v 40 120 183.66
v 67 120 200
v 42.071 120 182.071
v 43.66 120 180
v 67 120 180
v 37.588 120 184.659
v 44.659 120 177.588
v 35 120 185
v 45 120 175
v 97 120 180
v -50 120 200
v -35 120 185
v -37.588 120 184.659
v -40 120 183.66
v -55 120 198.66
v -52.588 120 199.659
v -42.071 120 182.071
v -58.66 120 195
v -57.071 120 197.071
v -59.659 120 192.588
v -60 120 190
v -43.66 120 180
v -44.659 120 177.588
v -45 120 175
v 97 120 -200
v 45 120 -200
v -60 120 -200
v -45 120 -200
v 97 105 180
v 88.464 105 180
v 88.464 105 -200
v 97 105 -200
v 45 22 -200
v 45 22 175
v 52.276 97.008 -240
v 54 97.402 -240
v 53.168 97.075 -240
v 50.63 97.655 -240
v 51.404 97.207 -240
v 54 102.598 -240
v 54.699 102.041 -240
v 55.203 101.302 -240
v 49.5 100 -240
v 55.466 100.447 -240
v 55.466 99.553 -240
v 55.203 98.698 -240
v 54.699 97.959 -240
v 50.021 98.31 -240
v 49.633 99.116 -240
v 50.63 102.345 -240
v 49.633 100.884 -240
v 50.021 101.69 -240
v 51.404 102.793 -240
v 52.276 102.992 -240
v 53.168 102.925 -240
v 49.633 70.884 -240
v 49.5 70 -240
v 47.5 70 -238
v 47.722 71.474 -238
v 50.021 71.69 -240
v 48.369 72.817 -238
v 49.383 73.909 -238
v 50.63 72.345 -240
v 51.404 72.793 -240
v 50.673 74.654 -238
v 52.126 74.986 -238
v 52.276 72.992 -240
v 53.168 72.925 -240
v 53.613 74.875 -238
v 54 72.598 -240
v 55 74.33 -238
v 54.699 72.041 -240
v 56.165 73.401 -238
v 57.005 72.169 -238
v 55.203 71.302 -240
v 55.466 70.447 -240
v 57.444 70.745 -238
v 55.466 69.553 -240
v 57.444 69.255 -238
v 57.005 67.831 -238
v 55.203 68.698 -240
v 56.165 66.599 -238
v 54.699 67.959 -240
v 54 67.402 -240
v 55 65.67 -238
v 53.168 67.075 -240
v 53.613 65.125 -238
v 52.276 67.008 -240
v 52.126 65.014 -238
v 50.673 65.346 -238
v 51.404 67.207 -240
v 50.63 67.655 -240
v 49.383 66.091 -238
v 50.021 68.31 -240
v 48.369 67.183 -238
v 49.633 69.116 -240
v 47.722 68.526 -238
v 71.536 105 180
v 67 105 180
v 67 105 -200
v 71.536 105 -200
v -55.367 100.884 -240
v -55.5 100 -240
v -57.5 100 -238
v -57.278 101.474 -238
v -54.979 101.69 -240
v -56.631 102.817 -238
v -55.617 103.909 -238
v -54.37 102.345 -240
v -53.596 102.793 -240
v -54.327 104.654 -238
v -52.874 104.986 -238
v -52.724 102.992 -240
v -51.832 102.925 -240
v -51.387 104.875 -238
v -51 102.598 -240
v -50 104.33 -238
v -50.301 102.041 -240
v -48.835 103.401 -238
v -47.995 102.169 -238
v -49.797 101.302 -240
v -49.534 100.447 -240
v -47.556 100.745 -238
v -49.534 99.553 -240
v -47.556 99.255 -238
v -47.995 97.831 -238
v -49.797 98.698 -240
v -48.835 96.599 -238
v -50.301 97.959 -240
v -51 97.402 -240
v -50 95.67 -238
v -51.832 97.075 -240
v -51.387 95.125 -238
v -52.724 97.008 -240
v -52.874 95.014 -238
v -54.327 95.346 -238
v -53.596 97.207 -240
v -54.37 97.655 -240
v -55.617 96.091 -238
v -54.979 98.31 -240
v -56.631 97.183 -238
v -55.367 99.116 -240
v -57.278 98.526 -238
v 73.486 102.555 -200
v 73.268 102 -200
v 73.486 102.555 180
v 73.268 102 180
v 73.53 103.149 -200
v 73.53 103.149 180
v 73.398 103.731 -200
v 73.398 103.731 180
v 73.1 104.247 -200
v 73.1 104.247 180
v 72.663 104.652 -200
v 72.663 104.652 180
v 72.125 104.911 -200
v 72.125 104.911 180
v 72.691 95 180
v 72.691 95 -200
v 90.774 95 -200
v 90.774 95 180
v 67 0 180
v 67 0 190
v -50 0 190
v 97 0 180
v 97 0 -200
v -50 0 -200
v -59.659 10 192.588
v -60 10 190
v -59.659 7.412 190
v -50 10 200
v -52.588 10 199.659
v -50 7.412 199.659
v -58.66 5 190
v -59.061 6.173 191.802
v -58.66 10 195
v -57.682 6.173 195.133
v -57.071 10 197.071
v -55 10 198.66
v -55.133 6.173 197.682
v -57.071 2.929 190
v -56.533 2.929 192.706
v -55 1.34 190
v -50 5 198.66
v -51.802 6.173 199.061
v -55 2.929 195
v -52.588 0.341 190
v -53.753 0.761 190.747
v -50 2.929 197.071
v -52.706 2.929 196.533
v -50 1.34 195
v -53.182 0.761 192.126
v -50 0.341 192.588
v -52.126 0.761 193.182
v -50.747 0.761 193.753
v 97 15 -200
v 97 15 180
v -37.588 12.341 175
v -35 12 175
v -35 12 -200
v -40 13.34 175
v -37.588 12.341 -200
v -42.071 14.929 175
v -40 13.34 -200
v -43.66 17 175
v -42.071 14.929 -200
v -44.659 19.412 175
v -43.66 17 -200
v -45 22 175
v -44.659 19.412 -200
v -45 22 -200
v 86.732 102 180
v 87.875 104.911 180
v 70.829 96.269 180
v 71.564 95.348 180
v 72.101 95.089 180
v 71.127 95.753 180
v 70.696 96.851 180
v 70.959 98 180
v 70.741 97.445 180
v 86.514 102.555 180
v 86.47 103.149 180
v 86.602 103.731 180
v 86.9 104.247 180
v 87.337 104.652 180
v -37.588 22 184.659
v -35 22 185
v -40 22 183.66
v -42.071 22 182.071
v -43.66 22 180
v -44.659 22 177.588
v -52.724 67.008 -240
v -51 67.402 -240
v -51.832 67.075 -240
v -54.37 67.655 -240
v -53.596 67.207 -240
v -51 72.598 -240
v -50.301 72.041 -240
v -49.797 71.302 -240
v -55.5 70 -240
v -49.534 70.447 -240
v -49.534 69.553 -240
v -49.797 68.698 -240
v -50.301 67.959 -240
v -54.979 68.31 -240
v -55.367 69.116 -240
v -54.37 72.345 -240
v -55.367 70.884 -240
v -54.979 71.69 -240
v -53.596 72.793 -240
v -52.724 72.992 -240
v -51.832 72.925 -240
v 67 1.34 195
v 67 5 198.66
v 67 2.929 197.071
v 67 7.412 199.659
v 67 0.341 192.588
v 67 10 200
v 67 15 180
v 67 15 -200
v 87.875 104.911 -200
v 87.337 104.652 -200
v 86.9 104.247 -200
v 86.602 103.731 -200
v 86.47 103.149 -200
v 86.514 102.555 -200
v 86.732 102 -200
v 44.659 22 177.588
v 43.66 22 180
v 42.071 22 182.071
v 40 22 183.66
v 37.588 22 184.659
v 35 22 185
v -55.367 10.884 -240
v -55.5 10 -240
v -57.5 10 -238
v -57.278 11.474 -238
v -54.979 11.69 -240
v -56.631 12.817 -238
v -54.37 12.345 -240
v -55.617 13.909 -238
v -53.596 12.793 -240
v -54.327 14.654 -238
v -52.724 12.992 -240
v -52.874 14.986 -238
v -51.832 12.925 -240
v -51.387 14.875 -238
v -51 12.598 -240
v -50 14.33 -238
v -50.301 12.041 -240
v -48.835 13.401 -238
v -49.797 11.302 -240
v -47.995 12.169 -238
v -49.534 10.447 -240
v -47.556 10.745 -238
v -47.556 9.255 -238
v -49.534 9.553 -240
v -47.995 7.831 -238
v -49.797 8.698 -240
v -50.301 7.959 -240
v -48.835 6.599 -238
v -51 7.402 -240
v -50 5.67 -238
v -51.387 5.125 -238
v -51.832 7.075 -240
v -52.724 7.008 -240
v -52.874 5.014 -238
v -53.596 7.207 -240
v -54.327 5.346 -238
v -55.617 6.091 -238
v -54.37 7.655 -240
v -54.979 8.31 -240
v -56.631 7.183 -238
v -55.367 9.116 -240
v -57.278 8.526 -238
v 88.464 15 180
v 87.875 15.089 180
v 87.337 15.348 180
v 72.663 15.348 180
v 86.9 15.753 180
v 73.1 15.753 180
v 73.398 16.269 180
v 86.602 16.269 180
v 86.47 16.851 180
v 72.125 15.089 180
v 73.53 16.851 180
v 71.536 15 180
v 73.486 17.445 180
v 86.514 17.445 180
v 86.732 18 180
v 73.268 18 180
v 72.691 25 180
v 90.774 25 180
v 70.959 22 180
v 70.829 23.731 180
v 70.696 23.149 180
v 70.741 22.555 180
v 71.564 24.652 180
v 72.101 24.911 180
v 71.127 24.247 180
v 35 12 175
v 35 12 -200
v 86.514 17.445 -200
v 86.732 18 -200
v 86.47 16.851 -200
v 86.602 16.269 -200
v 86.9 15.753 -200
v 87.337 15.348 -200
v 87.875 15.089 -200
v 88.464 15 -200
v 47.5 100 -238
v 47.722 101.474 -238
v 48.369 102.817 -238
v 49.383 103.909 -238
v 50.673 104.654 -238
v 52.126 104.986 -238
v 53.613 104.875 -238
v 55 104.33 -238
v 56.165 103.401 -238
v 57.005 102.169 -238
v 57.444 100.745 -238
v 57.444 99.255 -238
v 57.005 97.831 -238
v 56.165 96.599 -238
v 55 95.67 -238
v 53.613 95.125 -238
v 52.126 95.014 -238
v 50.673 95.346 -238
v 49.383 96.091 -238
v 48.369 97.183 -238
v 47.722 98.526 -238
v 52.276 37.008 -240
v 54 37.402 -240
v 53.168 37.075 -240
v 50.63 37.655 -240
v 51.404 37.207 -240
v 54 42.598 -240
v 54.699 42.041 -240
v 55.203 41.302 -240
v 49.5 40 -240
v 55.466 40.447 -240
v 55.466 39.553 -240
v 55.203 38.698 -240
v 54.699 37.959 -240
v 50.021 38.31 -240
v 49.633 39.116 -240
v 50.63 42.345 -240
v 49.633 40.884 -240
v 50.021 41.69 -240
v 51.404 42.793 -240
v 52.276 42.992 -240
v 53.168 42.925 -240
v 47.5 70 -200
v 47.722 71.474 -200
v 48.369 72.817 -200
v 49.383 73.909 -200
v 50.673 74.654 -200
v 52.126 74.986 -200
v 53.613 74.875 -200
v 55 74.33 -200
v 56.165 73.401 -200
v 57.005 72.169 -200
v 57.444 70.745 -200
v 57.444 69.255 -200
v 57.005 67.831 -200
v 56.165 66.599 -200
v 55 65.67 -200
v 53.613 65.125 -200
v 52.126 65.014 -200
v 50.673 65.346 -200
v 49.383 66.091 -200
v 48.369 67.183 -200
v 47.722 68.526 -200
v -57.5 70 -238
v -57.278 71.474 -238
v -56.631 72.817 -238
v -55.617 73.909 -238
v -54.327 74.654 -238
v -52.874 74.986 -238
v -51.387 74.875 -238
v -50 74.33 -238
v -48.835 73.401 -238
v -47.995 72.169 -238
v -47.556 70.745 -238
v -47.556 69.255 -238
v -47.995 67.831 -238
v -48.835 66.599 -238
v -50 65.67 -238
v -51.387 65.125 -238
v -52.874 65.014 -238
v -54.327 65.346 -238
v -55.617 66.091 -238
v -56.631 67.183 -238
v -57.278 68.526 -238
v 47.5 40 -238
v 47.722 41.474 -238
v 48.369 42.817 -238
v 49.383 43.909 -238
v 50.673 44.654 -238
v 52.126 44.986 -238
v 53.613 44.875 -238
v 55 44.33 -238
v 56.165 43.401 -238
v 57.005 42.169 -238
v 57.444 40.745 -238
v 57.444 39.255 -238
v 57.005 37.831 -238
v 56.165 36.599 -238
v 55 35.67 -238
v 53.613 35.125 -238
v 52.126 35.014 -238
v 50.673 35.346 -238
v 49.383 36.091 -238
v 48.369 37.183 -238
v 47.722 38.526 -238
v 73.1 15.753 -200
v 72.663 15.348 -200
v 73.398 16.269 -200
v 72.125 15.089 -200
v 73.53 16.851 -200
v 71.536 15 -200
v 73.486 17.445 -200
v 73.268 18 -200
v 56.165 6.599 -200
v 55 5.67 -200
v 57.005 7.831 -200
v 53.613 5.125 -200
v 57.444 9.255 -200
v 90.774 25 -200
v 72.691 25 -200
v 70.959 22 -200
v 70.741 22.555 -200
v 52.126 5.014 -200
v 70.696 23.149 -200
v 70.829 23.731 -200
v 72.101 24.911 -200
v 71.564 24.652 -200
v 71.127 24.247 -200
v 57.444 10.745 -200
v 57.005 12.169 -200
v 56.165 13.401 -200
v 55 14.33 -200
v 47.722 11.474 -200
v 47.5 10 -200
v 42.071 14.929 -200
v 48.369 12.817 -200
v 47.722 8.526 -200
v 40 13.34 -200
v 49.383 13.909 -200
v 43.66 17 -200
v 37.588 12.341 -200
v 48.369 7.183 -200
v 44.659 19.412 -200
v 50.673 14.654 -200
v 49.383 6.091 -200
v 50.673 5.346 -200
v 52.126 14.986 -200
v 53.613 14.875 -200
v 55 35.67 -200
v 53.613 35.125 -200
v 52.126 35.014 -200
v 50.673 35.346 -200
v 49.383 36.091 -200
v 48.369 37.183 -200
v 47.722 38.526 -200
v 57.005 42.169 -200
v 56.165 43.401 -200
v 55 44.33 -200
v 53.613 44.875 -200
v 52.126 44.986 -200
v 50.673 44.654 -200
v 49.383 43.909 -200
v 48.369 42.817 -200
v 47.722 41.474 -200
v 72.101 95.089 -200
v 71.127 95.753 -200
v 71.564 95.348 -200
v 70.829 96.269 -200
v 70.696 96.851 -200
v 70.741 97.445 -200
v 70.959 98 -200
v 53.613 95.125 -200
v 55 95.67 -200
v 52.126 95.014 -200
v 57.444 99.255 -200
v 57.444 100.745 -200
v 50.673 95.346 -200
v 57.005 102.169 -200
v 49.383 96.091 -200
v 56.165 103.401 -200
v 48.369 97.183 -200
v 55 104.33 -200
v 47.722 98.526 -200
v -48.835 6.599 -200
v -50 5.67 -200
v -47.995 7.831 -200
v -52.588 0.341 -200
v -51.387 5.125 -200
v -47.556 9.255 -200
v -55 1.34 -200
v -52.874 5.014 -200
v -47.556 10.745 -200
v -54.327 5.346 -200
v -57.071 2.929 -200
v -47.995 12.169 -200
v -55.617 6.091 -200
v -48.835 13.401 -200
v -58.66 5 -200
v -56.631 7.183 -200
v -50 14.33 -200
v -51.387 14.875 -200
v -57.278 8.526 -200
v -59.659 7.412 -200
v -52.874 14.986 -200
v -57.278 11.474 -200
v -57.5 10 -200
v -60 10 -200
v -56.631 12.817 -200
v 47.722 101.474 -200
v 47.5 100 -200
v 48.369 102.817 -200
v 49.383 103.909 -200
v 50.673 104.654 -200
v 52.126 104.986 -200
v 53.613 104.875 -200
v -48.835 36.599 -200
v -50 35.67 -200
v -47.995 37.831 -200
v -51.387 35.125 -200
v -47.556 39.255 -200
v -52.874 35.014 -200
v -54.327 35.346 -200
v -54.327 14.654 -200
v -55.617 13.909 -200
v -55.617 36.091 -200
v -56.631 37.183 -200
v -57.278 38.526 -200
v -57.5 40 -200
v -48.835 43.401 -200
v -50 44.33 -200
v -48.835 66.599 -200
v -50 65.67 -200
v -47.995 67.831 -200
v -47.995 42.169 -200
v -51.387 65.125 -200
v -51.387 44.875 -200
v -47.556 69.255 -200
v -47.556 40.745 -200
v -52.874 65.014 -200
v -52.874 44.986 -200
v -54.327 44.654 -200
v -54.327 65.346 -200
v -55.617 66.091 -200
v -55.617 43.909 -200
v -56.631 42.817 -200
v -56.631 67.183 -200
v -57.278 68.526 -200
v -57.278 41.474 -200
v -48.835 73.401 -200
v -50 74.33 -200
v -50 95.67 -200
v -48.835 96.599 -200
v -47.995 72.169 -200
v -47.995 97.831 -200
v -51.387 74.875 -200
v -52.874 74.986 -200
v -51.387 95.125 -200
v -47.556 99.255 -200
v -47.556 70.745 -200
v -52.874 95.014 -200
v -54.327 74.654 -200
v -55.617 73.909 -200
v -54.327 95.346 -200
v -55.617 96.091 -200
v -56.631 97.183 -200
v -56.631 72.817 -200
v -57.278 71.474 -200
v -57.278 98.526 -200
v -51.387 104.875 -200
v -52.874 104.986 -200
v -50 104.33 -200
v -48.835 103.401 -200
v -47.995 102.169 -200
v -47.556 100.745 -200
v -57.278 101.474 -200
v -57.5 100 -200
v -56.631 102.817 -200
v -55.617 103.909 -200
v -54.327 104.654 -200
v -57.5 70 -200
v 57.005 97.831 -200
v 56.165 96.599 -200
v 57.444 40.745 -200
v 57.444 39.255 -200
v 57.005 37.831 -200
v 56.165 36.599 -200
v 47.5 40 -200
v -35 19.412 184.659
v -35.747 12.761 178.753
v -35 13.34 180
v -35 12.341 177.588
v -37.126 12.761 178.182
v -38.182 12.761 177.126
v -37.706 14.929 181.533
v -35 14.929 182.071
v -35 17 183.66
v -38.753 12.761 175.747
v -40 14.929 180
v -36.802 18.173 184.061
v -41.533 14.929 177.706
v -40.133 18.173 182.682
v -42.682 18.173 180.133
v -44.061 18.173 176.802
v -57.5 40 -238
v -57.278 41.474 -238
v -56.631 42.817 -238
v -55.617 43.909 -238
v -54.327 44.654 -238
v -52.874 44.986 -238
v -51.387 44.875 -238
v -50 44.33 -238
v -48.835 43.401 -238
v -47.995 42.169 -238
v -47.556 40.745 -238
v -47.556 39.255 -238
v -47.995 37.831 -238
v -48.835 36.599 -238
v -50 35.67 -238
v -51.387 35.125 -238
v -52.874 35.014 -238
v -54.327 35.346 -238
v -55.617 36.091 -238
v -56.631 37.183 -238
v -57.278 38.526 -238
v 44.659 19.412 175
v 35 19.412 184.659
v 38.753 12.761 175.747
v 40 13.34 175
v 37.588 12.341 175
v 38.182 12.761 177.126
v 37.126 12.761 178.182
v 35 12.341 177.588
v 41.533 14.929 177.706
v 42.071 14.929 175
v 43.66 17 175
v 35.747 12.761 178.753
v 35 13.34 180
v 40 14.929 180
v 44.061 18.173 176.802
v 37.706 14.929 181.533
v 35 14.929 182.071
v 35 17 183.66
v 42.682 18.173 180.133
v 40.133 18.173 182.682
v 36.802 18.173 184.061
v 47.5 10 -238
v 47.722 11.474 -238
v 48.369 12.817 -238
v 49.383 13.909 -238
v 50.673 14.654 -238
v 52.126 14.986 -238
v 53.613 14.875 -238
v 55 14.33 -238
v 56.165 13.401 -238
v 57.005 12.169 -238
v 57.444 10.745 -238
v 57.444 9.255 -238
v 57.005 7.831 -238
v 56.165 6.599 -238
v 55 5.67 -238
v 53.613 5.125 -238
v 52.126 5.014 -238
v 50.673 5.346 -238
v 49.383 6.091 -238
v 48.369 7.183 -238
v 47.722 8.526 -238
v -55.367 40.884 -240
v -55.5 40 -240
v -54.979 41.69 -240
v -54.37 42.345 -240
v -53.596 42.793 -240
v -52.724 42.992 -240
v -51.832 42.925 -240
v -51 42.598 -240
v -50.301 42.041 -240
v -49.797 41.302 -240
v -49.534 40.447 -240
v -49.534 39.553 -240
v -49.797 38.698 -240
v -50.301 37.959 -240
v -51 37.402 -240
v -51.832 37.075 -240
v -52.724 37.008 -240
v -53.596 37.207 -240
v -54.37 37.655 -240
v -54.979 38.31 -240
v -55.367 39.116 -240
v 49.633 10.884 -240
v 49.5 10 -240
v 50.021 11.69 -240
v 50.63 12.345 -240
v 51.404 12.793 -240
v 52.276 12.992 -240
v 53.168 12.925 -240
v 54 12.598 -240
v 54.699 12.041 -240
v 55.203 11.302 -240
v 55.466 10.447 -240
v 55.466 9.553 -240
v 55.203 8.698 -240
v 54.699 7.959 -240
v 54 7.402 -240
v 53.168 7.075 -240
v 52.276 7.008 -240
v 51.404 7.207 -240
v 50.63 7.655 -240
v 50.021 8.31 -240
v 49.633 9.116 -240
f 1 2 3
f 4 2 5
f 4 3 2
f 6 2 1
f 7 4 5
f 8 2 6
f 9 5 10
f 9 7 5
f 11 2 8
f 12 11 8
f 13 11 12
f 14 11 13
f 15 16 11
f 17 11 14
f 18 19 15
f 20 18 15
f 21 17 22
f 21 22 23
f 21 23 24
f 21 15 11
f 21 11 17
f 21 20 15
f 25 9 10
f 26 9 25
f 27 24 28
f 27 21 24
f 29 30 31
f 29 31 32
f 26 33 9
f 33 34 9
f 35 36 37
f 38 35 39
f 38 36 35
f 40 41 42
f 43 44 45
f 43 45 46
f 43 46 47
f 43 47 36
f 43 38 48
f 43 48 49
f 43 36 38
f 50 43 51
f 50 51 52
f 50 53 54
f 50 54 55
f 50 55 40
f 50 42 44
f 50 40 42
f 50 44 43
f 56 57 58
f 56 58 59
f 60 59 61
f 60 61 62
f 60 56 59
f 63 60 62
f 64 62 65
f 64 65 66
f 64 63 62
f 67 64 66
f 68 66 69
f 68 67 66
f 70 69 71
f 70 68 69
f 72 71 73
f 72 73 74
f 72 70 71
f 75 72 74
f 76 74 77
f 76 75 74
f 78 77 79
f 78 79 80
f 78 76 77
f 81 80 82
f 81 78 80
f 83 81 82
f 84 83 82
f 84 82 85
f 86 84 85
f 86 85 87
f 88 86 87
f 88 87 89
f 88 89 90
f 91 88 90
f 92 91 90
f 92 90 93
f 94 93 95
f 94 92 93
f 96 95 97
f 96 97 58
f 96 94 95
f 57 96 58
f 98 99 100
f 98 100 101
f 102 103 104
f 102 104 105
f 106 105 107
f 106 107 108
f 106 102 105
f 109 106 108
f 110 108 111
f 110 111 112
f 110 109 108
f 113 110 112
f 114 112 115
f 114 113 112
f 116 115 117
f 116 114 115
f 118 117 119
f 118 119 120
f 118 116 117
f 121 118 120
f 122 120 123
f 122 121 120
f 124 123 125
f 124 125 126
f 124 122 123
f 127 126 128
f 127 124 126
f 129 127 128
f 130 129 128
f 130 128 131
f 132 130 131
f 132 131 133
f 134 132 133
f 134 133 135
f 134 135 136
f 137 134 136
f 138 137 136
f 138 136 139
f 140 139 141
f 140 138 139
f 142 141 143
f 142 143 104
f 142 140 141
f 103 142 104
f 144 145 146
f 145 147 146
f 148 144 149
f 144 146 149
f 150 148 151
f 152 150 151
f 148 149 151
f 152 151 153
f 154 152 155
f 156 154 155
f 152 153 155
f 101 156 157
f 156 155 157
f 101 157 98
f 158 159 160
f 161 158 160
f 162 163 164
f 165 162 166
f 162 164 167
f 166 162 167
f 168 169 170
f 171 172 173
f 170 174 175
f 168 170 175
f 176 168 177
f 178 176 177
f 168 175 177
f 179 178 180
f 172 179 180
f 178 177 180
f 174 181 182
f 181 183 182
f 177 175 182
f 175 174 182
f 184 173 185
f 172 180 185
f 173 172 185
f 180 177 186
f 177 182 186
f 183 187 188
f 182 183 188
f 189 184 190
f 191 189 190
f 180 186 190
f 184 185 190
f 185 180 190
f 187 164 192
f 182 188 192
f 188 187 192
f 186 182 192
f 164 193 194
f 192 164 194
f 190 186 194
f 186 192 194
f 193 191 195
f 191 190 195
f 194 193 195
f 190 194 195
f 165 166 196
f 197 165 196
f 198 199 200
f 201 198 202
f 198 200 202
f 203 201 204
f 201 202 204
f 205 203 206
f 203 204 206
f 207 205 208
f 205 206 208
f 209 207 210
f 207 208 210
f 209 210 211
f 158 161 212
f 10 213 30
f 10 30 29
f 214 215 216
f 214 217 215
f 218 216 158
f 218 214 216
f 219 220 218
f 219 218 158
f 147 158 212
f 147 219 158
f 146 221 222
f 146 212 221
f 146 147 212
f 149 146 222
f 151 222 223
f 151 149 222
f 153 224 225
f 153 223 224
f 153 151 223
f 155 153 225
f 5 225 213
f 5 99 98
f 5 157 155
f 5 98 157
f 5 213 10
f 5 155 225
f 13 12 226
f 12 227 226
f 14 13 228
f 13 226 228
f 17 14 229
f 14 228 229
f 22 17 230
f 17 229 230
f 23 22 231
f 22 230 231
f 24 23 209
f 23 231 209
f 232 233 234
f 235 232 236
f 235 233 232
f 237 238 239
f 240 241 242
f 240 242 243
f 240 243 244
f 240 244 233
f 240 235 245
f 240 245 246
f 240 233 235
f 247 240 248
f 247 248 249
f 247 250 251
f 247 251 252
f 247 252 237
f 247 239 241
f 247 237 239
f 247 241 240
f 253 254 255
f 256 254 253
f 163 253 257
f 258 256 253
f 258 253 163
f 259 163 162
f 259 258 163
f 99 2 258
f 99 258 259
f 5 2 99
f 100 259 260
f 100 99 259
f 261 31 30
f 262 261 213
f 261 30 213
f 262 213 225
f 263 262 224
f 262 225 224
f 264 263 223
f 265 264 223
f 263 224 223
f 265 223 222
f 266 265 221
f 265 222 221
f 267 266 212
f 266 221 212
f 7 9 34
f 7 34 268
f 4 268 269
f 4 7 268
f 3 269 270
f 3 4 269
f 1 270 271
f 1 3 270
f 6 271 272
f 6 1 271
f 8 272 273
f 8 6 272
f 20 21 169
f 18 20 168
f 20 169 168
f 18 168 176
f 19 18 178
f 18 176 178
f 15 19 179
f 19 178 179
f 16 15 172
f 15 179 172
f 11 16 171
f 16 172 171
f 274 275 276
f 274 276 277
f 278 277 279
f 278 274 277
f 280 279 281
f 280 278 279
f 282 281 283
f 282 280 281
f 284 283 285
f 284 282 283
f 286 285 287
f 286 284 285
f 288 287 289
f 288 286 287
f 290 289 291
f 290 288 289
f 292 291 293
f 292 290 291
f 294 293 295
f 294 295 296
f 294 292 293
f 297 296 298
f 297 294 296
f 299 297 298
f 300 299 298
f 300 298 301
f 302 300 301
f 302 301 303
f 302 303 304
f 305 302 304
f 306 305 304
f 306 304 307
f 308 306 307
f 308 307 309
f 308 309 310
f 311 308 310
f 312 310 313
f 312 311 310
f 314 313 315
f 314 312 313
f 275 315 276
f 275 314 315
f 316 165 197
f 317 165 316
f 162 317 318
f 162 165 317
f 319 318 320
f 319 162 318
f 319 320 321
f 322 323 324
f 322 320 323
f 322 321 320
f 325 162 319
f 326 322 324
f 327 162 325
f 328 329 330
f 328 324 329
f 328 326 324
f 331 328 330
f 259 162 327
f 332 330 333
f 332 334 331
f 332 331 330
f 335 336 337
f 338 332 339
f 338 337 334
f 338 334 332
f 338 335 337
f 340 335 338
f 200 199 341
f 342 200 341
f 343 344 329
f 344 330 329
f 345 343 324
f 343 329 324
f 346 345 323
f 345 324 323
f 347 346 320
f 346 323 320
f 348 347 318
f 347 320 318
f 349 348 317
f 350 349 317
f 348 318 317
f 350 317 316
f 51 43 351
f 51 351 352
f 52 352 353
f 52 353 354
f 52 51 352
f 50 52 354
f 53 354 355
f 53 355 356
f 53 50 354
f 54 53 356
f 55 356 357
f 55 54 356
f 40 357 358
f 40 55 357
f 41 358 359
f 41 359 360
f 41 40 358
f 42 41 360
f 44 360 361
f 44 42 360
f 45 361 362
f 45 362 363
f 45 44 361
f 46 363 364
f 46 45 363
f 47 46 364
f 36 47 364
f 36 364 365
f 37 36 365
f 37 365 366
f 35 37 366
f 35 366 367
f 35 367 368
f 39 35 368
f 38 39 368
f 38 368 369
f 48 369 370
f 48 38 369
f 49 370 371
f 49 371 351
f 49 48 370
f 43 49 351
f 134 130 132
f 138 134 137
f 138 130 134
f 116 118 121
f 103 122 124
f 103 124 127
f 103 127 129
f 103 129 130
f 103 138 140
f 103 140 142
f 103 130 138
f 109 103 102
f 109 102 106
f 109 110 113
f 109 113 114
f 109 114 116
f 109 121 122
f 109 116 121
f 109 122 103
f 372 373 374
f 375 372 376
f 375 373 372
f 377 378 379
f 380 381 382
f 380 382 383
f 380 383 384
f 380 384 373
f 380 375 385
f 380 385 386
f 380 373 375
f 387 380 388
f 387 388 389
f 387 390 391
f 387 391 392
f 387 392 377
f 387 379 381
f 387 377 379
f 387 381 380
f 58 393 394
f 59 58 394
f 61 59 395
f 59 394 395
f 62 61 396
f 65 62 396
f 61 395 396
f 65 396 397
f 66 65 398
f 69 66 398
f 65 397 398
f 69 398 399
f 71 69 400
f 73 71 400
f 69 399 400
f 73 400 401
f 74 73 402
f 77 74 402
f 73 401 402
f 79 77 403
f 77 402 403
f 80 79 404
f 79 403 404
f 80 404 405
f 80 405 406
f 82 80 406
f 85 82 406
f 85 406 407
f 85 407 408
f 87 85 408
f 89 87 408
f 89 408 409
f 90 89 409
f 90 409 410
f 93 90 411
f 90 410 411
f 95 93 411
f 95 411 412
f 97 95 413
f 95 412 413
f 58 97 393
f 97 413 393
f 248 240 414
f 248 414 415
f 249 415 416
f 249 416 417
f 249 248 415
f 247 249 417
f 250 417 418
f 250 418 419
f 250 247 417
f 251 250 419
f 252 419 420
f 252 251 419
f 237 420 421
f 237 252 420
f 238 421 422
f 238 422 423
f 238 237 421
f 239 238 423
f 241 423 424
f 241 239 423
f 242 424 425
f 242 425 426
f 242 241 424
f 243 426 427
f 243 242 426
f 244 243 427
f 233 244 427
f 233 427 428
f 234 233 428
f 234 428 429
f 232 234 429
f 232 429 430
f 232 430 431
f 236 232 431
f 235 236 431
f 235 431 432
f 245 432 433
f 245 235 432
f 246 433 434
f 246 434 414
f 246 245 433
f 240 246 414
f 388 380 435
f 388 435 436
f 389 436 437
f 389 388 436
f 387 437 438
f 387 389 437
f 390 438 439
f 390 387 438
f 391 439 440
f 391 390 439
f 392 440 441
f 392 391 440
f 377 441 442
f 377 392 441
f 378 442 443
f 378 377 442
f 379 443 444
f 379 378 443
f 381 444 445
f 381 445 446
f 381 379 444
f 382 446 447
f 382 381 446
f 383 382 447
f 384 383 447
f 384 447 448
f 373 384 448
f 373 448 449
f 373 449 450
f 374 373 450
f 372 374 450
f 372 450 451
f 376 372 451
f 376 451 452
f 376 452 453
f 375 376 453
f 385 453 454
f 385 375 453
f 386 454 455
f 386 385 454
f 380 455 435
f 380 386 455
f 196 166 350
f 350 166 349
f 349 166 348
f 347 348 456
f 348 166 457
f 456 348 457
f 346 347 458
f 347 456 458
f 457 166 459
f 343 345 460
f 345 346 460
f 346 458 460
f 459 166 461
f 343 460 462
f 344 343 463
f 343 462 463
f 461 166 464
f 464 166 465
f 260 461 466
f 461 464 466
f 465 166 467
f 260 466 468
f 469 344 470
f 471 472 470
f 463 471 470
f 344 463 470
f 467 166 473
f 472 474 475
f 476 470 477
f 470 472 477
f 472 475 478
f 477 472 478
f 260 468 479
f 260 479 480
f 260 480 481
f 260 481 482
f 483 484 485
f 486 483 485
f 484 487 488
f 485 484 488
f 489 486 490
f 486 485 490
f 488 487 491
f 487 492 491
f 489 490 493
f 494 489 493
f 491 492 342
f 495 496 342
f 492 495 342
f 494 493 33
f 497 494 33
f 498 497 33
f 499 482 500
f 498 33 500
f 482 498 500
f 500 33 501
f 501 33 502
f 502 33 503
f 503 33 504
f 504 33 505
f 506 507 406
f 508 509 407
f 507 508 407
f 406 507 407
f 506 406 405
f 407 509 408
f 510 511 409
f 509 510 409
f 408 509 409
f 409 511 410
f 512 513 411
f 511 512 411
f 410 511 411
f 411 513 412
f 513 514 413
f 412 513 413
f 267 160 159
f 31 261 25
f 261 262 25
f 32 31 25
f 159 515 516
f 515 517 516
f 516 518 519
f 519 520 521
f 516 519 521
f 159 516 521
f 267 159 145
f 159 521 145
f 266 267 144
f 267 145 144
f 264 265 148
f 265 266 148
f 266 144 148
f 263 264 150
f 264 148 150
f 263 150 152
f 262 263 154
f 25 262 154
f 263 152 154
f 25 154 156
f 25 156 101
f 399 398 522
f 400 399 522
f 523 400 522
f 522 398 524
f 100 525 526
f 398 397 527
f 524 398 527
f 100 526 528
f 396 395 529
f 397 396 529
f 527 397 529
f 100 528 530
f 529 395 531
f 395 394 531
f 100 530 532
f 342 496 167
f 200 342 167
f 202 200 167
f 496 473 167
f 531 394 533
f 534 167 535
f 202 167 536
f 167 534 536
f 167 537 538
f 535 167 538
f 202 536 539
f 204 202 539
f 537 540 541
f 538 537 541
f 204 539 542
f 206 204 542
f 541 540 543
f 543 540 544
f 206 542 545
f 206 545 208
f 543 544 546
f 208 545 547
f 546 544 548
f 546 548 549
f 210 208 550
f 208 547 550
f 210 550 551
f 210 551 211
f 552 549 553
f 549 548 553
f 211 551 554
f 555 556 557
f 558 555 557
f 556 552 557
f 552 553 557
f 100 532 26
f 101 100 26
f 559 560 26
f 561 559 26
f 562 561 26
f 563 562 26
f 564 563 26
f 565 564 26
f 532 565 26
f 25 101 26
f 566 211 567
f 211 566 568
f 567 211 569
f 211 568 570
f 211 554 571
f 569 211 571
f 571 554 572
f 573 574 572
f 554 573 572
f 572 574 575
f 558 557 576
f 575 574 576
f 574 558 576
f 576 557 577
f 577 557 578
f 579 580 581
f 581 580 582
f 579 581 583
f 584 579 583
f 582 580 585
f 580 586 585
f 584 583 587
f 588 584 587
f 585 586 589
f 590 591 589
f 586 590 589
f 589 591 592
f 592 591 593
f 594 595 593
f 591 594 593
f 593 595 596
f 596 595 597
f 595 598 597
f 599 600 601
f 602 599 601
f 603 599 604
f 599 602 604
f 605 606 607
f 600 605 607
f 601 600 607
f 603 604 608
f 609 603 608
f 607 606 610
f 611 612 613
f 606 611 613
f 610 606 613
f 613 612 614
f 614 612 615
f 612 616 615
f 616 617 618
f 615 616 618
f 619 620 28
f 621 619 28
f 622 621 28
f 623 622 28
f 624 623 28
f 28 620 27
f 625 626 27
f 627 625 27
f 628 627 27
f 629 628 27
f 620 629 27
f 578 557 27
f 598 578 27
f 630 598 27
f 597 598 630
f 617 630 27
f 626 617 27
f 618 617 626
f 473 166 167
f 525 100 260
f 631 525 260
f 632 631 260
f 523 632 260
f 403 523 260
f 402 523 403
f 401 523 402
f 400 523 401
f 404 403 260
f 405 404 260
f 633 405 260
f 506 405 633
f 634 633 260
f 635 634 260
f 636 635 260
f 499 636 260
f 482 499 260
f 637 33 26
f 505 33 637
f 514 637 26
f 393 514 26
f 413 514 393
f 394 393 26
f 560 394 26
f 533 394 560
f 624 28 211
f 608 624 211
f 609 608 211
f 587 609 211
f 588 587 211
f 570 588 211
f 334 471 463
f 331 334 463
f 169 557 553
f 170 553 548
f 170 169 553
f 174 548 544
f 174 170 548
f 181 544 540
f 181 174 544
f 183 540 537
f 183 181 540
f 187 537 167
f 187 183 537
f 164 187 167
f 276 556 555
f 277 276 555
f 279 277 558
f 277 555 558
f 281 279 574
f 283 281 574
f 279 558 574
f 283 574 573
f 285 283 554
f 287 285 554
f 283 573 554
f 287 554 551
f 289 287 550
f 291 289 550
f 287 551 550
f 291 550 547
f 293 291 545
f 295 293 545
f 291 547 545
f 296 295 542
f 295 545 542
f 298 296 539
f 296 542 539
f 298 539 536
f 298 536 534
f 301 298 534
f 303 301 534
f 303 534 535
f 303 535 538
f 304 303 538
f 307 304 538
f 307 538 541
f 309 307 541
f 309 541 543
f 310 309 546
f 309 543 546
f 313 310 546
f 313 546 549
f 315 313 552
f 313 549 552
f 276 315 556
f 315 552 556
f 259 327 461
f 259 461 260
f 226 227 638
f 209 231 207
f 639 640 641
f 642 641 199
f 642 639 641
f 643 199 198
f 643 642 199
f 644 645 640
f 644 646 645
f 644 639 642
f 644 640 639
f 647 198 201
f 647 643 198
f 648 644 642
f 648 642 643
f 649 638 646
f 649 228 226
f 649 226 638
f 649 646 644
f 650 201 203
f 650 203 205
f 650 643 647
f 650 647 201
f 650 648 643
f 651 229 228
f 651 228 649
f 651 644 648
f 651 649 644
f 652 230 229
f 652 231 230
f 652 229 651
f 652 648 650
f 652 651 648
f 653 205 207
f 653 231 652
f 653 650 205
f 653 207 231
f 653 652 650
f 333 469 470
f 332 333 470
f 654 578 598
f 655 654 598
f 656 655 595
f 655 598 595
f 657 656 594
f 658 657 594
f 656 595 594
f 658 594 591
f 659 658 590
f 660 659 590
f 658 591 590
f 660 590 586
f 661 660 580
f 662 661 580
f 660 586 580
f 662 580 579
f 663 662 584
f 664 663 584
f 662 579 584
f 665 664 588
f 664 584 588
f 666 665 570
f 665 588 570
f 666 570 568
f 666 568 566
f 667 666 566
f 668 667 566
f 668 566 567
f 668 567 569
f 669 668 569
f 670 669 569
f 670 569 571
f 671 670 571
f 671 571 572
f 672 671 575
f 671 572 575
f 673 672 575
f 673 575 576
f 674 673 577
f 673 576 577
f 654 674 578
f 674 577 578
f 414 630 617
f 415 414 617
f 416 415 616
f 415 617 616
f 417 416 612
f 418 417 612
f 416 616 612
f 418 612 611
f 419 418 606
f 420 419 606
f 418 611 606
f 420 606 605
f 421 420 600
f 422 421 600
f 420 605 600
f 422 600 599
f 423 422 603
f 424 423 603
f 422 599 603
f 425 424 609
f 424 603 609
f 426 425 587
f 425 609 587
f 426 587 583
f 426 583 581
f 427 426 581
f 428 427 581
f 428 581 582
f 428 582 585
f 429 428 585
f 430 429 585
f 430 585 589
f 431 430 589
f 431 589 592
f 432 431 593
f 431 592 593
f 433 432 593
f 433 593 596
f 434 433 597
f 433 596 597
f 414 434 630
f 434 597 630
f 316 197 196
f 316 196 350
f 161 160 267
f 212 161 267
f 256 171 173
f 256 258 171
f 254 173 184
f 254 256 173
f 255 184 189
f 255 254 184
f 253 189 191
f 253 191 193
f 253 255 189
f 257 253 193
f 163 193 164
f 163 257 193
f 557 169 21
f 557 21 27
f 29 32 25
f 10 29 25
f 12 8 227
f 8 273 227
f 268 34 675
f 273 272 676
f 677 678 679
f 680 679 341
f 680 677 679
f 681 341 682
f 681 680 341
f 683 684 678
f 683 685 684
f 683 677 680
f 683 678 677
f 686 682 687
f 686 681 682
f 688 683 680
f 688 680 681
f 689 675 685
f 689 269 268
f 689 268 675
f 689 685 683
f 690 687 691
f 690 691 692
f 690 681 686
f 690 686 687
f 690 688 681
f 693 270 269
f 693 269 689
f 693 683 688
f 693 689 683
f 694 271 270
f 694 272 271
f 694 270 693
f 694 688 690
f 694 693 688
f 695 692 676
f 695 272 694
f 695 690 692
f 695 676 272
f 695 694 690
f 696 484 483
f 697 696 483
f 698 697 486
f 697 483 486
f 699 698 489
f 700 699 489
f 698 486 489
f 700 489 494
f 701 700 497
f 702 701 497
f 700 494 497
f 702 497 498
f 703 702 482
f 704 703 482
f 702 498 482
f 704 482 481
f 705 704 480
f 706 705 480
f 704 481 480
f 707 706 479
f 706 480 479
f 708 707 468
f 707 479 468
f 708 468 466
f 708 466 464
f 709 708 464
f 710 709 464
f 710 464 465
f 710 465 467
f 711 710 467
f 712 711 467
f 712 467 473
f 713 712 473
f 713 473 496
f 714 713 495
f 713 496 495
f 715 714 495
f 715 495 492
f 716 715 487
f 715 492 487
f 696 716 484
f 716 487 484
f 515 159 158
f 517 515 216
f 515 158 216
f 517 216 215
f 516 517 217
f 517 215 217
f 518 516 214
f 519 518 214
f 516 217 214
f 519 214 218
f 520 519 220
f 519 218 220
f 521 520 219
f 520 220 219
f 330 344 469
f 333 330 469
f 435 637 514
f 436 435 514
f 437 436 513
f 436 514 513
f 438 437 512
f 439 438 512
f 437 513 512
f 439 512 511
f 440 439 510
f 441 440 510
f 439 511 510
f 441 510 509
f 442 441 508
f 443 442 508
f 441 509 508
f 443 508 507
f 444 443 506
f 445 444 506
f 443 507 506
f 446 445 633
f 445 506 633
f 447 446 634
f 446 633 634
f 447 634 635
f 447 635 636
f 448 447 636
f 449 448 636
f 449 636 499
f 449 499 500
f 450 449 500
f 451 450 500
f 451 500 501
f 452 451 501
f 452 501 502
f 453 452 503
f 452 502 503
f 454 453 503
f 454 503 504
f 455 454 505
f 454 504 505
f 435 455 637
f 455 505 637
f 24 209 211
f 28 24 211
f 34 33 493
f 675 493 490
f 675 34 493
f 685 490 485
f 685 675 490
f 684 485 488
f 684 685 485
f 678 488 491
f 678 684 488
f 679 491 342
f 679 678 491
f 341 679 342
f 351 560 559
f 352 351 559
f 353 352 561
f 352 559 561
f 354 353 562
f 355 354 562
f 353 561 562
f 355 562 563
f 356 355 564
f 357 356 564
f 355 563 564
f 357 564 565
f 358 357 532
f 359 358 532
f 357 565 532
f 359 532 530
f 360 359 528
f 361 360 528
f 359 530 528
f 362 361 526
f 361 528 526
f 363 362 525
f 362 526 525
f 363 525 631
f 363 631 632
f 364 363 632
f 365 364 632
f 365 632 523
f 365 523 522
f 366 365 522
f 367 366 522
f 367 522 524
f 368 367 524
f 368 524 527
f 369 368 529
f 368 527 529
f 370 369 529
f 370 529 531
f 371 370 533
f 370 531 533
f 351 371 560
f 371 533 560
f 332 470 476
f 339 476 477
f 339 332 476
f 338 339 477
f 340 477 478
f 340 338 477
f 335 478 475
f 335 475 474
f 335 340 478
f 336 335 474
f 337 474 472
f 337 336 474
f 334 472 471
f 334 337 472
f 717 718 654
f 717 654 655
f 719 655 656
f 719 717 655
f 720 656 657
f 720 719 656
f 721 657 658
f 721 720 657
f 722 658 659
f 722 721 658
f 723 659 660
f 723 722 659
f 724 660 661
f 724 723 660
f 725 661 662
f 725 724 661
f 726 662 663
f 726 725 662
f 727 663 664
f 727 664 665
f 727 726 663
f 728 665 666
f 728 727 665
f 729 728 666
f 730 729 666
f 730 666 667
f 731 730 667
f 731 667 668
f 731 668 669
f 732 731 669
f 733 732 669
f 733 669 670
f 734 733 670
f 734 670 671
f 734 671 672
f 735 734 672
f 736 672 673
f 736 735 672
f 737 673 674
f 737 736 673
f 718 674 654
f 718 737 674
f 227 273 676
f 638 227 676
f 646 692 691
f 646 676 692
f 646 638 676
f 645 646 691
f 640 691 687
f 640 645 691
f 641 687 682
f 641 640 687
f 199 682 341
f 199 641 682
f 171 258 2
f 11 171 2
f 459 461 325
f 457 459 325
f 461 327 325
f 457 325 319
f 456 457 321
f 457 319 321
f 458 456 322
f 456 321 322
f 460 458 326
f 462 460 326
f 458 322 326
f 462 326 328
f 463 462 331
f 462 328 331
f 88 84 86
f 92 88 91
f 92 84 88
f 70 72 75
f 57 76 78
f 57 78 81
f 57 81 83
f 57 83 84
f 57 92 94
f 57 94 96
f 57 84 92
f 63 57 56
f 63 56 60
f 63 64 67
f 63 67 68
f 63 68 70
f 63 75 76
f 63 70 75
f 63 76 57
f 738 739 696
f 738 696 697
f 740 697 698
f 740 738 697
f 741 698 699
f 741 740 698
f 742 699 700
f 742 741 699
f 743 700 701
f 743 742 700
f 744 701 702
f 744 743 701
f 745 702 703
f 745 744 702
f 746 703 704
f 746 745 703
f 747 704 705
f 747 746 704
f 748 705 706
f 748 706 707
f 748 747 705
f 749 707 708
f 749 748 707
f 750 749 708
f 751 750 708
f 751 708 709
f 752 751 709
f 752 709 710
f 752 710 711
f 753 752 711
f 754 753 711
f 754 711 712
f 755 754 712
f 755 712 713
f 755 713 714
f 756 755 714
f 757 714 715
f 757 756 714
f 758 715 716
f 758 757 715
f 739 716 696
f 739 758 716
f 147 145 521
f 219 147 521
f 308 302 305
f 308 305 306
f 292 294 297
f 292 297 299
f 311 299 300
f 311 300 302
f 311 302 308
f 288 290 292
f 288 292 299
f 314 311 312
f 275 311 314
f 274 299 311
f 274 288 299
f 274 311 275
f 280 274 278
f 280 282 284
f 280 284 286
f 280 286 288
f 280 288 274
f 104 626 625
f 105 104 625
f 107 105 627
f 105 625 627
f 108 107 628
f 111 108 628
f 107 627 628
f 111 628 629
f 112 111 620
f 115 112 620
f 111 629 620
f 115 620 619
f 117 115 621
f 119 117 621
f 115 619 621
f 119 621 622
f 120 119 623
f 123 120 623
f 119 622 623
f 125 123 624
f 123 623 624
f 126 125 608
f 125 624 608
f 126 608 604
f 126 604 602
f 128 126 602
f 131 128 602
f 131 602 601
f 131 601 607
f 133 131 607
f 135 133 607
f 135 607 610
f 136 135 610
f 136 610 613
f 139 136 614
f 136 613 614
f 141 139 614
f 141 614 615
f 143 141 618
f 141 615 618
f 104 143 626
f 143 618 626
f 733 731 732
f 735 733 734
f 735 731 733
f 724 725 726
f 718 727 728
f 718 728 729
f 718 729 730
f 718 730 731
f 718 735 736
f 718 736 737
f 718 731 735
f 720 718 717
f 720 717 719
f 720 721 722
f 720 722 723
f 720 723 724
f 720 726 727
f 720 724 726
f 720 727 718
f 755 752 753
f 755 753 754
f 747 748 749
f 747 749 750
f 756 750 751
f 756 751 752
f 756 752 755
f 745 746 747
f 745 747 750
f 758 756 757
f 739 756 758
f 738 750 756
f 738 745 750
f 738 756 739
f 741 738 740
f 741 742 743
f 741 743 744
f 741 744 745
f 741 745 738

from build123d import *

# Parameters (mm, degrees)
SURFACE_EXTRUDE1_1_DEPTH = 120
THICKEN1_T2              = 15
SKETCH5_W                = 90
SKETCH5_H                = 120
CUT_EXTRUDE1_DEPTH       = 120
SKETCH4_W                = 120
SKETCH4_H                = 400
THICKEN2_T1              = 12
FILLET1_R                = 10
FILLET2_R                = 10
SKETCH6_R                = 5
BOSS_EXTRUDE1_DEPTH      = 40
CHAMFER1_SIZE            = 2
CHAMFER2_SIZE            = 2
SKETCH7_W                = 380
SKETCH7_H                = 120
BOSS_EXTRUDE2_DEPTH      = 40
CUT_EXTRUDE2_DEPTH       = 380
SKETCH9_W                = 3
SKETCH9_H                = 120
CUT_EXTRUDE3_DEPTH       = 440
FILLET4_R                = 2
FILLET5_R                = 2
SKETCH10_W               = 40
SKETCH10_H               = 120
CUT_EXTRUDE4_DEPTH       = 20
SKETCH11_W               = 20
SKETCH11_H               = 120
BOSS_EXTRUDE3_DEPTH      = 10
FILLET6_R                = 10


with BuildPart() as body_1:
    # Surface-Extrude1: a surface, the sketch's curves swept straight by 120 mm
    with BuildLine(Plane(origin=(0, 0, 0), x_dir=(1, 0, 0), z_dir=(0, 1, 0)), mode=Mode.PRIVATE) as surface_extrude1_1_path:
        Line((60, -200), (-60, -200))
        Line((-60, -200), (-60, 200))
        Line((-60, 200), (60, 200))
        Line((60, 200), (60, -200))
    surface_extrude1_1 = Shell.extrude(surface_extrude1_1_path.wire(), (0 * SURFACE_EXTRUDE1_1_DEPTH, 1 * SURFACE_EXTRUDE1_1_DEPTH, 0 * SURFACE_EXTRUDE1_1_DEPTH))
    add(Solid.thicken(surface_extrude1_1, -THICKEN1_T2))

    # Sketch5 → Cut-Extrude1 (cut)
    with BuildSketch(Plane.XY.offset(-185)):
        with Locations((0, 60)):
            Rectangle(SKETCH5_W, SKETCH5_H)
    extrude(amount=-CUT_EXTRUDE1_DEPTH, mode=Mode.SUBTRACT)

    # Sketch4 → Surface-Plane1: a flat surface bounded by the sketch
    with BuildSketch(Plane(origin=(0, 0, 0), x_dir=(1, 0, 0), z_dir=(0, 1, 0)), mode=Mode.PRIVATE) as surface_plane1_2_region:
        Rectangle(SKETCH4_W, SKETCH4_H)
    surface_plane1_2 = surface_plane1_2_region.sketch.faces()[0]
    add(Solid.thicken(surface_plane1_2, THICKEN2_T1))

    # Fillet1
    fillet1_edges = [body_1.edges().sort_by_distance(p)[0] for p in [
        (45, 66, 185),
        (45, 12, -7.5),
        (-45, 66, 185),
        (0, 12, 185),
        (-45, 12, -7.5),
    ]]
    fillet(fillet1_edges, radius=FILLET1_R)

    # Fillet2
    fillet2_edges = [body_1.edges().sort_by_distance(p)[0] for p in [
        (-60, 60, 200),
    ]]
    fillet(fillet2_edges, radius=FILLET2_R)

    # Sketch6 → Boss-Extrude1 (add)
    with BuildSketch(Plane(origin=(0, 0, -200), x_dir=(-1, 0, 0), z_dir=(0, 0, -1))):
        with Locations((-52.5, 100)):
            Circle(SKETCH6_R)
        with Locations((52.5, 100)):
            Circle(SKETCH6_R)
        with Locations((-52.5, 70)):
            Circle(SKETCH6_R)
        with Locations((-52.5, 40)):
            Circle(SKETCH6_R)
        with Locations((-52.5, 10)):
            Circle(SKETCH6_R)
        with Locations((52.5, 70)):
            Circle(SKETCH6_R)
        with Locations((52.5, 40)):
            Circle(SKETCH6_R)
        with Locations((52.5, 10)):
            Circle(SKETCH6_R)
    extrude(amount=BOSS_EXTRUDE1_DEPTH)

    # Chamfer1
    chamfer1_edges = [body_1.edges().sort_by_distance(p)[0] for p in [
        (57.5, 100, -240),
        (57.5, 70, -240),
        (57.5, 40, -240),
        (57.5, 10, -240),
    ]]
    chamfer(chamfer1_edges, length=CHAMFER1_SIZE)

    # Chamfer2
    chamfer2_edges = [body_1.edges().sort_by_distance(p)[0] for p in [
        (-47.5, 100, -240),
        (-47.5, 70, -240),
        (-47.5, 40, -240),
        (-47.5, 10, -240),
    ]]
    chamfer(chamfer2_edges, length=CHAMFER2_SIZE)

    # Sketch7 → Boss-Extrude2 (add)
    with BuildSketch(Plane(origin=(60, 0, 0), x_dir=(0, 0, -1), z_dir=(1, 0, 0))):
        with Locations((10, 60)):
            Rectangle(SKETCH7_W, SKETCH7_H)
    extrude(amount=BOSS_EXTRUDE2_DEPTH)

    # Sketch8 → Cut-Extrude2 (cut)
    with BuildSketch(Plane(origin=(0, 0, -200), x_dir=(-1, 0, 0), z_dir=(0, 0, -1))):
        Polygon((-97, 105), (-100, 105), (-100, 15), (-97, 15), (-85, 15), (-90.773502692, 25), (-85, 25), (-80, 25), (-80, 95), (-85, 95), (-90.773502692, 95), (-85, 105), align=None)
        Polygon((-75, 95), (-80, 95), (-80, 25), (-75, 25), (-69.226497308, 25), (-75, 15), (-67, 15), (-67, 105), (-75, 105), (-69.226497308, 95), align=None)
    extrude(amount=-CUT_EXTRUDE2_DEPTH, mode=Mode.SUBTRACT)

    # Sketch9 → Cut-Extrude3 (cut)
    with BuildSketch(Plane(origin=(0, 0, -200), x_dir=(-1, 0, 0), z_dir=(0, 0, -1))):
        with Locations((-98.5, 60)):
            Rectangle(SKETCH9_W, SKETCH9_H)
    extrude(amount=-CUT_EXTRUDE3_DEPTH, mode=Mode.SUBTRACT)

    # Fillet4
    fillet4_edges = [body_1.edges().sort_by_distance(p)[0] for p in [
        (85, 15, -10),
        (85, 105, -10),
        (75, 105, -10),
        (75, 15, -10),
    ]]
    fillet(fillet4_edges, radius=FILLET4_R)

    # Fillet5
    fillet5_edges = [body_1.edges().sort_by_distance(p)[0] for p in [
        (69.226497308, 25, -10),
        (69.226497308, 95, -10),
    ]]
    fillet(fillet5_edges, radius=FILLET5_R)

    # Sketch10 → Cut-Extrude4 (cut)
    with BuildSketch(Plane.XY.offset(180)):
        with Locations((77, 60)):
            Rectangle(SKETCH10_W, SKETCH10_H)
    extrude(amount=CUT_EXTRUDE4_DEPTH, mode=Mode.SUBTRACT)

    # Sketch11 → Boss-Extrude3 (add)
    with BuildSketch(Plane(origin=(57, 0, 0), x_dir=(0, 0, -1), z_dir=(1, 0, 0))):
        with Locations((-190, 60)):
            Rectangle(SKETCH11_W, SKETCH11_H)
    extrude(amount=BOSS_EXTRUDE3_DEPTH)

    # Fillet6
    fillet6_edges = [body_1.edges().sort_by_distance(p)[0] for p in [
        (8.5, 0, 200),
        (-57.071067812, 0, 197.071067812),
        (-60, 0, -5),
    ]]
    fillet(fillet6_edges, radius=FILLET6_R)


solid = body_1.part
